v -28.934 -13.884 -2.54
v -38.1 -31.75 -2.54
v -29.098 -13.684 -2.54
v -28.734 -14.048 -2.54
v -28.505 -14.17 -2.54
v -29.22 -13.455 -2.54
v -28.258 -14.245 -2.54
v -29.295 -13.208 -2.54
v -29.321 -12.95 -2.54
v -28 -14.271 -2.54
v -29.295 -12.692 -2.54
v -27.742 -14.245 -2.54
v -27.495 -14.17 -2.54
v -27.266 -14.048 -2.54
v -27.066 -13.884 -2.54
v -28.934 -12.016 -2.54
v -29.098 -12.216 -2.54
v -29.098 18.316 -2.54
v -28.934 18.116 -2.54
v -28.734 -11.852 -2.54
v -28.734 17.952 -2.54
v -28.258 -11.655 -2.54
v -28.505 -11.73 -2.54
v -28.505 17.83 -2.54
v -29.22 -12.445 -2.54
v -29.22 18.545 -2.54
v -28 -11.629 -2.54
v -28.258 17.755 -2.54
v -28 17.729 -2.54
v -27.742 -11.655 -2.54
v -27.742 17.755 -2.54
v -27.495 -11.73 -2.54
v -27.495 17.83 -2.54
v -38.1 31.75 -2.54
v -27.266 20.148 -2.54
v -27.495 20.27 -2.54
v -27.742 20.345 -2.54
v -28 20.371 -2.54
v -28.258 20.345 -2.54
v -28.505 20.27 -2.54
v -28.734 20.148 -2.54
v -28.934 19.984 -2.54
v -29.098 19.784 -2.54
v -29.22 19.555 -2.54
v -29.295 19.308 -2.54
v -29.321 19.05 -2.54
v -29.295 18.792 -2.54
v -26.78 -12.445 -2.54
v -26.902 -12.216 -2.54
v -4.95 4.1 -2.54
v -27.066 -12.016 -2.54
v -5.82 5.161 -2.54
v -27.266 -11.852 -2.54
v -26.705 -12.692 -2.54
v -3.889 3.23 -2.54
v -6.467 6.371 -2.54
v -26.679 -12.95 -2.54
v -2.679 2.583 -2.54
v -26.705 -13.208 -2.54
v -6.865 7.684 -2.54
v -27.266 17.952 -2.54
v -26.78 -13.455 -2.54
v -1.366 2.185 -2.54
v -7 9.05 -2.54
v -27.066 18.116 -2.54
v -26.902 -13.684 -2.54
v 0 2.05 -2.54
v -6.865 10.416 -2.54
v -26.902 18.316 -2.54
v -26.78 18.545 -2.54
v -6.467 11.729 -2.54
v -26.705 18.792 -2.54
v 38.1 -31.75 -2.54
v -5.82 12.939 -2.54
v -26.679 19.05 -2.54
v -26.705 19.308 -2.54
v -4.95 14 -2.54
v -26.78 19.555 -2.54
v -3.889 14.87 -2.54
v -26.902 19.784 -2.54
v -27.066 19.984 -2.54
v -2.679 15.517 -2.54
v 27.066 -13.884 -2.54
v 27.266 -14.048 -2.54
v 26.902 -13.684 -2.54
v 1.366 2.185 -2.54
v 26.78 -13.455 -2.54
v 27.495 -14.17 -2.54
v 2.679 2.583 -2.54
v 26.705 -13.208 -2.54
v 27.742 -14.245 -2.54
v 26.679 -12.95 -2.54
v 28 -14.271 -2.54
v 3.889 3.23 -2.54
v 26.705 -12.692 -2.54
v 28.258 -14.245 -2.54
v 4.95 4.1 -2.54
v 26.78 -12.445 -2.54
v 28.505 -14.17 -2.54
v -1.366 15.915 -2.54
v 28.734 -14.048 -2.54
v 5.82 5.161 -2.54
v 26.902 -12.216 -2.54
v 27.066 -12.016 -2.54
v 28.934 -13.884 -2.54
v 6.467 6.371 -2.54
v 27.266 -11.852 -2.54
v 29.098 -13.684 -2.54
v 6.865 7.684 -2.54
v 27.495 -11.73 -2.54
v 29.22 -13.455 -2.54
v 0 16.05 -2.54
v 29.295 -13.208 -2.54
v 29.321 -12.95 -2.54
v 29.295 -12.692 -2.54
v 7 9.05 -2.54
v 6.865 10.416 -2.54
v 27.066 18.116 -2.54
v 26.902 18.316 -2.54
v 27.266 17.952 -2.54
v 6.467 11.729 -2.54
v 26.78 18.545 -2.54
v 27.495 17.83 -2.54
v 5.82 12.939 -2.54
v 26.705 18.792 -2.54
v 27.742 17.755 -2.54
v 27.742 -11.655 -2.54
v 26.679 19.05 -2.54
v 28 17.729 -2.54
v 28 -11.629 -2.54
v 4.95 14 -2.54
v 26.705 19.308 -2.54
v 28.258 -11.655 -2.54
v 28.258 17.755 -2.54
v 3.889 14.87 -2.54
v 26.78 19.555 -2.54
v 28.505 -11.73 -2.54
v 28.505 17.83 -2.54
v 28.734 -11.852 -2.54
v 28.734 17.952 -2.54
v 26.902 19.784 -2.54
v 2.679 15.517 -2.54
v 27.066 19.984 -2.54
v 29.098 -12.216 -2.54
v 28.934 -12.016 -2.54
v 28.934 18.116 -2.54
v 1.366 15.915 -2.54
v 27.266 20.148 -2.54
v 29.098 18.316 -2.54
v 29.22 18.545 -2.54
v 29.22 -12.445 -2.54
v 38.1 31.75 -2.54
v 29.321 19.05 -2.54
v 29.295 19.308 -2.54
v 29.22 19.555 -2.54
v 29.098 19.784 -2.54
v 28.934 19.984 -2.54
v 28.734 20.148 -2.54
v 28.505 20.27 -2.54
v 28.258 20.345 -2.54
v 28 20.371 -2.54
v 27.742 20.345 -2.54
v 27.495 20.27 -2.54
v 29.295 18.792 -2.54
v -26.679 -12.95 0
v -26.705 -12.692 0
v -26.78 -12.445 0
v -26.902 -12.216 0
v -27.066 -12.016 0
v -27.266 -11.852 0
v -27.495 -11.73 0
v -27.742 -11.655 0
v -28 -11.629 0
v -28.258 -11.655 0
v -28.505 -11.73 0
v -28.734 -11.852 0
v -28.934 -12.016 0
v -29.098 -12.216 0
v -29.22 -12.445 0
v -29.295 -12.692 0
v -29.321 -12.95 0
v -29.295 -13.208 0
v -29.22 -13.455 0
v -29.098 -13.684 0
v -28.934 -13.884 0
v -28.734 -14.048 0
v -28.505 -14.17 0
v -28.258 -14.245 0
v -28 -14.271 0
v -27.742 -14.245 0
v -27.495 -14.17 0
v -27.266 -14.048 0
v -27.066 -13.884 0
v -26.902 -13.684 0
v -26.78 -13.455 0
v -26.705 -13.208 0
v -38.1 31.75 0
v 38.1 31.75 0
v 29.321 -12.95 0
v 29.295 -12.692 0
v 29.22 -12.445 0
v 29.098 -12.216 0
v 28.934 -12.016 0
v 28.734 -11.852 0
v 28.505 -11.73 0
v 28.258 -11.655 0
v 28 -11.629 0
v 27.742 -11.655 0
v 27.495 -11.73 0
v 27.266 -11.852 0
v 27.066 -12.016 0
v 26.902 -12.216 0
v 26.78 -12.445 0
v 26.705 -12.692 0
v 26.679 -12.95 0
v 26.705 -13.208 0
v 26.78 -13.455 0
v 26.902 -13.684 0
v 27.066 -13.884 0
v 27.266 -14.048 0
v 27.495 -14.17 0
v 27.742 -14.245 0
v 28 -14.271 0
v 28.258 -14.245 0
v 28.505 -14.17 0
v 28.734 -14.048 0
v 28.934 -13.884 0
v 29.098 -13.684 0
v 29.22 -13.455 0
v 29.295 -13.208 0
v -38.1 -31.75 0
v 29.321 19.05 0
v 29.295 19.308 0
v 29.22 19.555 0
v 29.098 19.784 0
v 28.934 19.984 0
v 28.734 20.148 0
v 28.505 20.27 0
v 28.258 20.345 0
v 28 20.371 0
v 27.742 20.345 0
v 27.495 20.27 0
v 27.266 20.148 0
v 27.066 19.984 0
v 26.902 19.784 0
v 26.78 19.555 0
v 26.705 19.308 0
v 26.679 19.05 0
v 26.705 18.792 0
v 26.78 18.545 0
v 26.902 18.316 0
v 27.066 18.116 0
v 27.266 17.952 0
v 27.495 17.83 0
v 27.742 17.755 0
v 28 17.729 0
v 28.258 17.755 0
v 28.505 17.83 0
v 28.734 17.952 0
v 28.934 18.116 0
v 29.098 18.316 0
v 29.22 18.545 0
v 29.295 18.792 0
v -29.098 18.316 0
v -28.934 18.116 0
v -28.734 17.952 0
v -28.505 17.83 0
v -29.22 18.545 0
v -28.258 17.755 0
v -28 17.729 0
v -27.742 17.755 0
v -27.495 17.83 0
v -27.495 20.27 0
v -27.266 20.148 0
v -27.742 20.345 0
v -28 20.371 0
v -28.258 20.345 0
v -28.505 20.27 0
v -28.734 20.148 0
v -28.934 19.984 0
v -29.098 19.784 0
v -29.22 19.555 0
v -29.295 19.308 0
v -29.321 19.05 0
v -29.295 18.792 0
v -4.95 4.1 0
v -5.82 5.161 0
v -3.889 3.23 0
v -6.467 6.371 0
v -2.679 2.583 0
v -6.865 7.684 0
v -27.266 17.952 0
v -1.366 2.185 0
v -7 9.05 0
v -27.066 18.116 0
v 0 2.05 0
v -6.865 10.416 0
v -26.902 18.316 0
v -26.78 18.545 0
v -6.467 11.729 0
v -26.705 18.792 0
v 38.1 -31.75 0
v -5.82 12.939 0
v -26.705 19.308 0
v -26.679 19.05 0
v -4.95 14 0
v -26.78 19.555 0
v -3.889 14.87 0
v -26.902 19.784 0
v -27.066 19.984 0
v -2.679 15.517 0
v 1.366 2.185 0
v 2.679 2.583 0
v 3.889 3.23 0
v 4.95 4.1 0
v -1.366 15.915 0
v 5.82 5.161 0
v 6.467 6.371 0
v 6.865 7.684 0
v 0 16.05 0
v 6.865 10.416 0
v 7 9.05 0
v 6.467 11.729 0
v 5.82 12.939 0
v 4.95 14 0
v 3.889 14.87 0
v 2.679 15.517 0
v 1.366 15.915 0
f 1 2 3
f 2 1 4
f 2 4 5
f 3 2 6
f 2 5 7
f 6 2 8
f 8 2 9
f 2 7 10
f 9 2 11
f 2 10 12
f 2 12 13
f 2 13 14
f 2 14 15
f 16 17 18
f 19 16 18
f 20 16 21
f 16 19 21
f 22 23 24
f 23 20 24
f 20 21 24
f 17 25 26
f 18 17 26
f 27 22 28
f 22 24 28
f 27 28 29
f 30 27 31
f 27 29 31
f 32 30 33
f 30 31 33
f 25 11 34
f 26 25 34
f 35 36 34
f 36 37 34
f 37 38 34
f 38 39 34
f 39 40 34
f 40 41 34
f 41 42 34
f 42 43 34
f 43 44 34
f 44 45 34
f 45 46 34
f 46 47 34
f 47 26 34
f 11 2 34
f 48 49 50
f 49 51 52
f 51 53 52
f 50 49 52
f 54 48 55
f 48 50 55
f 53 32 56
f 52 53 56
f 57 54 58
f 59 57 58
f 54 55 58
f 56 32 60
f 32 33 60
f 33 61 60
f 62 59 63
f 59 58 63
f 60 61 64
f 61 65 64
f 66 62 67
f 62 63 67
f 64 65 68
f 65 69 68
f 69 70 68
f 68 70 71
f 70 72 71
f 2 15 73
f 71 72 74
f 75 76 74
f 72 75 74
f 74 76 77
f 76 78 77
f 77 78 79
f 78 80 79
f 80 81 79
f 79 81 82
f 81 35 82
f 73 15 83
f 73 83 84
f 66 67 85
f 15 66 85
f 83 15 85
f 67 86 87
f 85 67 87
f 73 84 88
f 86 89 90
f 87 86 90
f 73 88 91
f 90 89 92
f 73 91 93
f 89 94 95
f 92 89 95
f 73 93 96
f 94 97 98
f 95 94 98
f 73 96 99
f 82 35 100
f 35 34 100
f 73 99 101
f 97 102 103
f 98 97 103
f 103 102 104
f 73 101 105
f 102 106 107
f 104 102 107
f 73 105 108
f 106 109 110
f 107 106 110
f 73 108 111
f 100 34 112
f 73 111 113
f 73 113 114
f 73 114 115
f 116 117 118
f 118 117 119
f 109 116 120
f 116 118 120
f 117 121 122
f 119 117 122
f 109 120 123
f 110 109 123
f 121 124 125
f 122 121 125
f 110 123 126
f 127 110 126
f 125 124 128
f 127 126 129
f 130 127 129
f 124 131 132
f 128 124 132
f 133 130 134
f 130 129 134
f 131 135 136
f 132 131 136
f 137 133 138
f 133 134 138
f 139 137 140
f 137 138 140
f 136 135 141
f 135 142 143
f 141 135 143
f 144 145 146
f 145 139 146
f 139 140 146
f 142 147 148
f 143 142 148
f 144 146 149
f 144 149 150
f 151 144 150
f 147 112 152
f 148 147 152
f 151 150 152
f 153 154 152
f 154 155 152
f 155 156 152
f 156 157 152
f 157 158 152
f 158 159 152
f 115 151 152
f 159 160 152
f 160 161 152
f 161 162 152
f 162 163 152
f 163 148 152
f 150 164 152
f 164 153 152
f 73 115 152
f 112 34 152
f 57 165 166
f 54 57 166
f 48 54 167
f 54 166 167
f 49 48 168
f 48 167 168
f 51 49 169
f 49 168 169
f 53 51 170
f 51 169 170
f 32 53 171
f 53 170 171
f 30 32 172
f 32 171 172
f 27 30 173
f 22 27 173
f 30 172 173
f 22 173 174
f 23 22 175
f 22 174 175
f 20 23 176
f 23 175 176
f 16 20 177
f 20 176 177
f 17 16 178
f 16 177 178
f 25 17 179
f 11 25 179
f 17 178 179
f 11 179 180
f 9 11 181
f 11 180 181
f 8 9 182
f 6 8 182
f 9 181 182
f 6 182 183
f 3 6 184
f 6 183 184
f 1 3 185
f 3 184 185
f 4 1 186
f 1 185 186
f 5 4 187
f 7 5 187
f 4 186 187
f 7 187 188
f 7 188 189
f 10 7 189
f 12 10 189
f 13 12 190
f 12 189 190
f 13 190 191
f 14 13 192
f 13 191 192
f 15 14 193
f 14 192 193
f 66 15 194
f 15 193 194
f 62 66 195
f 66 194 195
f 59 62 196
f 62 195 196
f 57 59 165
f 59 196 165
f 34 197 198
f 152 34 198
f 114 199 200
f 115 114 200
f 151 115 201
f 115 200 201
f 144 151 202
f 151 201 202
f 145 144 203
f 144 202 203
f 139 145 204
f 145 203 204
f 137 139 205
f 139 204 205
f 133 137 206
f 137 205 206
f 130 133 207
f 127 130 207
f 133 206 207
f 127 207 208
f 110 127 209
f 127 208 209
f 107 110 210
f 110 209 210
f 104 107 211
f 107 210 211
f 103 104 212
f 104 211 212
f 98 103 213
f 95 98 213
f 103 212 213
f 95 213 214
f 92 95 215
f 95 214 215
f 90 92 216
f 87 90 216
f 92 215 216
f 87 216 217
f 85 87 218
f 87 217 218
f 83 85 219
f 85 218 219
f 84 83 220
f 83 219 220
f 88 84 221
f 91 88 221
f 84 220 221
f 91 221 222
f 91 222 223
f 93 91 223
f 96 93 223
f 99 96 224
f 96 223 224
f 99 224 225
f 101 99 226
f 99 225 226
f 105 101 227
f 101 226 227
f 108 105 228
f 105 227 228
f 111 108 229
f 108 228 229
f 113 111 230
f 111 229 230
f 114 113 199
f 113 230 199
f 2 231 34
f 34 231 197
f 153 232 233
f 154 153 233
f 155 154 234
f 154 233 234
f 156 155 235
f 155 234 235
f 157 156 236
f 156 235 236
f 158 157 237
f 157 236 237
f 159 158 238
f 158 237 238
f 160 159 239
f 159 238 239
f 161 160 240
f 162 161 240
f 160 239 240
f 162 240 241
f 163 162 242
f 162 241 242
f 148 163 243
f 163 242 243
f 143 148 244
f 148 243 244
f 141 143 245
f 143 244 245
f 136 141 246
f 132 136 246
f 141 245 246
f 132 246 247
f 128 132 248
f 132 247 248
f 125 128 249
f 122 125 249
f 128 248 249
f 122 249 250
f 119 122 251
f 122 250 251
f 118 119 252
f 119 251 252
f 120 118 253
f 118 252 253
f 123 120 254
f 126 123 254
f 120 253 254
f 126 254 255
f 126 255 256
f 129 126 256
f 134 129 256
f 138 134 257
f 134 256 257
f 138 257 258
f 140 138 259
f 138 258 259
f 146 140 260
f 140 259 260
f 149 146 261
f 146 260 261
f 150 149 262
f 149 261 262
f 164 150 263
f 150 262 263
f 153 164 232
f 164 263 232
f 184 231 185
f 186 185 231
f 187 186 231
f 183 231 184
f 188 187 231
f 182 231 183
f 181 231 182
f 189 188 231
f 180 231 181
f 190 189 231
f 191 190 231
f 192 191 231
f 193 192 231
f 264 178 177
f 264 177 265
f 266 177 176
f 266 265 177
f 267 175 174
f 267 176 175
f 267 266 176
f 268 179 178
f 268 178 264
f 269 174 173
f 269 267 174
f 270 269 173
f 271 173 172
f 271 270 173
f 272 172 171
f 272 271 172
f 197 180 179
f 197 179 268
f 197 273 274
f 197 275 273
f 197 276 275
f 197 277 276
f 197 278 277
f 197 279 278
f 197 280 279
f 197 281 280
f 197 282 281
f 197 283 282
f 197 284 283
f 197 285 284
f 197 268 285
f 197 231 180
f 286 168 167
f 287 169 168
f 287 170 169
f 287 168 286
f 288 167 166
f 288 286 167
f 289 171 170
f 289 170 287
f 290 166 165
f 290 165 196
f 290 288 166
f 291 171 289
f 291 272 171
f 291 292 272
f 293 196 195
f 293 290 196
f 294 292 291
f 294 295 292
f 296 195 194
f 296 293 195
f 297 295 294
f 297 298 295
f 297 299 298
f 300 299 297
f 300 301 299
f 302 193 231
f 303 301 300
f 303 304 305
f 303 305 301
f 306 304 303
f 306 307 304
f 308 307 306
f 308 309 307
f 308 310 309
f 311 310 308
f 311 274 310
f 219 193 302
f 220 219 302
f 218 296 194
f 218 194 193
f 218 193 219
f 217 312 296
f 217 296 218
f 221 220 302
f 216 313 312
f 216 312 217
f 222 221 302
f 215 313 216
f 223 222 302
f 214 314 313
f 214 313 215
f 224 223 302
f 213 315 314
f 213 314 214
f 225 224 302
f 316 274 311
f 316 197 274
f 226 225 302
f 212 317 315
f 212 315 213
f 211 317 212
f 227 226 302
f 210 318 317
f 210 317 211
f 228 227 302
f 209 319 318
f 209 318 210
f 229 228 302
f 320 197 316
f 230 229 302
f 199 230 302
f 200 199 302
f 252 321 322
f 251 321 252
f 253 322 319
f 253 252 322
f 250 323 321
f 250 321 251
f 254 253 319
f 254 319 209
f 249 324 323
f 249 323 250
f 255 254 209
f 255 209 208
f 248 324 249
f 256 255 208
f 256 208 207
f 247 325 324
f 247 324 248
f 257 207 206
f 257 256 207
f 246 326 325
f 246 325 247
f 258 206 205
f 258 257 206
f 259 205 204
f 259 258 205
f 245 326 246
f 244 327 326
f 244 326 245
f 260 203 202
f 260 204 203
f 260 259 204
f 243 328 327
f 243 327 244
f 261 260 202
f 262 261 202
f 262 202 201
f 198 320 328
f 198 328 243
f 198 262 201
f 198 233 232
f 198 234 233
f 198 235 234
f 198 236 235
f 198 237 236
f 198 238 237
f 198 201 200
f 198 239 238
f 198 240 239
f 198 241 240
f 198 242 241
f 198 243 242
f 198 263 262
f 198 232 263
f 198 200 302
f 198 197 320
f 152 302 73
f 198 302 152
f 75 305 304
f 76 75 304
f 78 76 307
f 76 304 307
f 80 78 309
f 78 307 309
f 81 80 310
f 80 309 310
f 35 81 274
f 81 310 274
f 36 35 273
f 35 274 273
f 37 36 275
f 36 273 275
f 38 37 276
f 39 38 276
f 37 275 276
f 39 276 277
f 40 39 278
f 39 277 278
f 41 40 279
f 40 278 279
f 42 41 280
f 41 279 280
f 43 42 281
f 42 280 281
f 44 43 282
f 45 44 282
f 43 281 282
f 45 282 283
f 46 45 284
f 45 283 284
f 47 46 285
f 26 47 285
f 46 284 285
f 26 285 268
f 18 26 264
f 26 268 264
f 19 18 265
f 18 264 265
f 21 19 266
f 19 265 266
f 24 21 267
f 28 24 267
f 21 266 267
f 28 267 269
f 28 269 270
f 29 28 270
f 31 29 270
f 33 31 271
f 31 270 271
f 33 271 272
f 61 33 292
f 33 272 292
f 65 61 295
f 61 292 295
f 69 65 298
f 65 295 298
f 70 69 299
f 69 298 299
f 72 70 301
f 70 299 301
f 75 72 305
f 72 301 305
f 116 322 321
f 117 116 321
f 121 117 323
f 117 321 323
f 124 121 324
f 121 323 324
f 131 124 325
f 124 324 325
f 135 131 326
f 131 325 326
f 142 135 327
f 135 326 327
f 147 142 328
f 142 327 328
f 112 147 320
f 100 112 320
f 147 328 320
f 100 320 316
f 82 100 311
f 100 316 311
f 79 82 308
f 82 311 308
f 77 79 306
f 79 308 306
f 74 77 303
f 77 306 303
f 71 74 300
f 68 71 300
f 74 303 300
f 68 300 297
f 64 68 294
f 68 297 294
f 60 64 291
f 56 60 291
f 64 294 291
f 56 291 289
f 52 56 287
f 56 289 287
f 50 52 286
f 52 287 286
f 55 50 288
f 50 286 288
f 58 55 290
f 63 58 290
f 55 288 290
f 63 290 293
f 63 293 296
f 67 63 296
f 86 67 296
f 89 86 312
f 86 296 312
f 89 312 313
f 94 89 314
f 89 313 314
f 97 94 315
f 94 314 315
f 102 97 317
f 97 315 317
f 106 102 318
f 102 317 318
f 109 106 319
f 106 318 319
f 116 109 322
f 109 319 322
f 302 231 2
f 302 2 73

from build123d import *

# Parameters (mm, degrees)
SKETCH1_W           = 76.2
SKETCH1_H           = 63.5
SKETCH1_R           = 1.3208
SKETCH1_R_2         = 7
BOSS_EXTRUDE1_DEPTH = 2.54


with BuildPart() as part:
    # Sketch1 → Boss-Extrude1 (new body)
    with BuildSketch(Plane.XY):
        Rectangle(SKETCH1_W, SKETCH1_H)
        with Locations((-28, 19.05)):
            Circle(SKETCH1_R, mode=Mode.SUBTRACT)
        with Locations((28, 19.05)):
            Circle(SKETCH1_R, mode=Mode.SUBTRACT)
        with Locations((-28, -12.95)):
            Circle(SKETCH1_R, mode=Mode.SUBTRACT)
        with Locations((28, -12.95)):
            Circle(SKETCH1_R, mode=Mode.SUBTRACT)
        with Locations((0, 9.05)):
            Circle(SKETCH1_R_2, mode=Mode.SUBTRACT)
    extrude(amount=-BOSS_EXTRUDE1_DEPTH)


solid = part.part
